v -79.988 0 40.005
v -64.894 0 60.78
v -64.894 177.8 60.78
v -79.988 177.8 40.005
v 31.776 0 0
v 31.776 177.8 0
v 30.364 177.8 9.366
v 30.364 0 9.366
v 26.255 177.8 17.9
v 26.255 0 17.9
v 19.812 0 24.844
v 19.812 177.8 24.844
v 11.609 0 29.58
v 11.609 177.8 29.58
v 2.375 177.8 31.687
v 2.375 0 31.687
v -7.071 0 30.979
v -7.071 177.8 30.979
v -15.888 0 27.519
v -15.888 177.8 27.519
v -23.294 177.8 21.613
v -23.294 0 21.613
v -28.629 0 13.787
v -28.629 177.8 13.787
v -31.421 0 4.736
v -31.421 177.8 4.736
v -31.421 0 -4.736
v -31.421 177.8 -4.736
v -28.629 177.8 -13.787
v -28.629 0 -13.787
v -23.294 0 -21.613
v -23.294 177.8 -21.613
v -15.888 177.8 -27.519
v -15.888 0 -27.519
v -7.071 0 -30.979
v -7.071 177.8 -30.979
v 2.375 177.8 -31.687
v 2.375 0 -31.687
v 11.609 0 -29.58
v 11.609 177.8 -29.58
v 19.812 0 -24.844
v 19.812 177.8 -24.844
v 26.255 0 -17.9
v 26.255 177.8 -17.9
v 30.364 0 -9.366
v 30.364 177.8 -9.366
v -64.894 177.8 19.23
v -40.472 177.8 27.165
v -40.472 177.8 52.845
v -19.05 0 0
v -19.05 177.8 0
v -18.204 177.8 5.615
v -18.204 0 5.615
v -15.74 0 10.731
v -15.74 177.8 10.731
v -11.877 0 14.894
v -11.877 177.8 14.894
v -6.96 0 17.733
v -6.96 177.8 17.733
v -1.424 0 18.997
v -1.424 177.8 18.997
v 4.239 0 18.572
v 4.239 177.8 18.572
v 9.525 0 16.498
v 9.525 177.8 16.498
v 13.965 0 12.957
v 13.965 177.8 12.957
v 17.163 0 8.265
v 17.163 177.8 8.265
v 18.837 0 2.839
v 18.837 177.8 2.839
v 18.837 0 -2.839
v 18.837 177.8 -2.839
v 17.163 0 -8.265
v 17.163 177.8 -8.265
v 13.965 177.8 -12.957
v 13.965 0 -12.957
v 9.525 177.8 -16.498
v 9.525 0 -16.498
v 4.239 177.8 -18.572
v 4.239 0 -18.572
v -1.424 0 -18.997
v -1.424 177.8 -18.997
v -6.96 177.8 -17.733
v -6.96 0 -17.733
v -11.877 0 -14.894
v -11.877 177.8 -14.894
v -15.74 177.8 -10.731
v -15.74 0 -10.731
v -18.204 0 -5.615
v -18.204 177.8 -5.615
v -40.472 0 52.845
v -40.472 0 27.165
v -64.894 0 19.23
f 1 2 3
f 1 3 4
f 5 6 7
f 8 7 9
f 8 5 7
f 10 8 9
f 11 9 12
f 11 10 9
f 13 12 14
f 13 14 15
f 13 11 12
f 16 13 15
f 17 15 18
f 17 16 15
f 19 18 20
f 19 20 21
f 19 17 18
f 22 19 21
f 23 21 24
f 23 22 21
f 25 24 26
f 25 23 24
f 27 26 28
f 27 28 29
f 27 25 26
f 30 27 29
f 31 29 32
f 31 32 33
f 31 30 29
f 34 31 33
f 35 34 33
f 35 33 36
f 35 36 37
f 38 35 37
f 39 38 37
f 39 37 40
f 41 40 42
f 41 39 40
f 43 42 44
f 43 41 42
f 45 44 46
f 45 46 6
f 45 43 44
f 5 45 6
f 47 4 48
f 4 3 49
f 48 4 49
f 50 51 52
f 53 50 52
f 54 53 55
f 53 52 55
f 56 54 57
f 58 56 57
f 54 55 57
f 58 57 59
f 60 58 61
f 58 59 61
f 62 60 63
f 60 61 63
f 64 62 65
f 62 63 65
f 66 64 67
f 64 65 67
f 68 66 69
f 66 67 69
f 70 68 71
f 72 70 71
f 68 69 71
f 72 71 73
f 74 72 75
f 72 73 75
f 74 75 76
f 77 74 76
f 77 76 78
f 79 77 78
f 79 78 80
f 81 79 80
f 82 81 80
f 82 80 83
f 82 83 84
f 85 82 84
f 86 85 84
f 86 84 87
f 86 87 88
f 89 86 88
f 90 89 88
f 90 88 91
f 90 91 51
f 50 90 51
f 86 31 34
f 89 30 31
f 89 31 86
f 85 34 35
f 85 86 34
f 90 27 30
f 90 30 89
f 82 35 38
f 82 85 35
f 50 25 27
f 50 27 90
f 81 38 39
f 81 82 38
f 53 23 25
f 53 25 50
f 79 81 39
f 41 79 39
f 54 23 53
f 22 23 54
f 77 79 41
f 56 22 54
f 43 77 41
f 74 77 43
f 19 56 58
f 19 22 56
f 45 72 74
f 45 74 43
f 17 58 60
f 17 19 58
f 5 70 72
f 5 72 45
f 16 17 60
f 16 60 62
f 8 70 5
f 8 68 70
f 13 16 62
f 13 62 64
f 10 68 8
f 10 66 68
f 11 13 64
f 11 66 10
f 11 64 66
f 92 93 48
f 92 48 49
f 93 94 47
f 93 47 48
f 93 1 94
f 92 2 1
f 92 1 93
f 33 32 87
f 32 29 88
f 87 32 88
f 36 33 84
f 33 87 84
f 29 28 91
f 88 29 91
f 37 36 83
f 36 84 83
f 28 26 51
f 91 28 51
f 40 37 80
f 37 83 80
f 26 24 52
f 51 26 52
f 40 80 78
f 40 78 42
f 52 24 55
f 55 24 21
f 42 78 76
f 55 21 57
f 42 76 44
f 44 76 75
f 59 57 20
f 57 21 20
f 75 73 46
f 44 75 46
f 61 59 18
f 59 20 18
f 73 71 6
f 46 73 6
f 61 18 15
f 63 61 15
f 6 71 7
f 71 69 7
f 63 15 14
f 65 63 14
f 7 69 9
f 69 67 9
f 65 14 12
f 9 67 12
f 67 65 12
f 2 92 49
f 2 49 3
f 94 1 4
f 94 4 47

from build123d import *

# Parameters (mm, degrees)
F0_R     = 31.776086
F1_DEPTH = 177.8
F3_D     = 38.1
F5_DEPTH = 177.8


with BuildPart() as f1:
    # F0 (on Front) → F1 (new body)
    with BuildSketch(Plane.XZ):
        Circle(F0_R)
    extrude(amount=-F1_DEPTH)

    # F3 (through all)
    with Locations(Plane.XZ):
        with Locations((0, 0)):
            Hole(F3_D / 2)


with BuildPart() as f5:
    # F4 (on Front) → F5 (new body)
    with BuildSketch(Plane.XZ):
        Polygon((-40.471558, 27.165284), (-40.471558, 52.84472), (-64.894153, 60.780102), (-79.988146, 40.005002), (-64.894153, 19.229902), align=None)
    extrude(amount=-F5_DEPTH)


solid = Compound([f1.part, f5.part])
